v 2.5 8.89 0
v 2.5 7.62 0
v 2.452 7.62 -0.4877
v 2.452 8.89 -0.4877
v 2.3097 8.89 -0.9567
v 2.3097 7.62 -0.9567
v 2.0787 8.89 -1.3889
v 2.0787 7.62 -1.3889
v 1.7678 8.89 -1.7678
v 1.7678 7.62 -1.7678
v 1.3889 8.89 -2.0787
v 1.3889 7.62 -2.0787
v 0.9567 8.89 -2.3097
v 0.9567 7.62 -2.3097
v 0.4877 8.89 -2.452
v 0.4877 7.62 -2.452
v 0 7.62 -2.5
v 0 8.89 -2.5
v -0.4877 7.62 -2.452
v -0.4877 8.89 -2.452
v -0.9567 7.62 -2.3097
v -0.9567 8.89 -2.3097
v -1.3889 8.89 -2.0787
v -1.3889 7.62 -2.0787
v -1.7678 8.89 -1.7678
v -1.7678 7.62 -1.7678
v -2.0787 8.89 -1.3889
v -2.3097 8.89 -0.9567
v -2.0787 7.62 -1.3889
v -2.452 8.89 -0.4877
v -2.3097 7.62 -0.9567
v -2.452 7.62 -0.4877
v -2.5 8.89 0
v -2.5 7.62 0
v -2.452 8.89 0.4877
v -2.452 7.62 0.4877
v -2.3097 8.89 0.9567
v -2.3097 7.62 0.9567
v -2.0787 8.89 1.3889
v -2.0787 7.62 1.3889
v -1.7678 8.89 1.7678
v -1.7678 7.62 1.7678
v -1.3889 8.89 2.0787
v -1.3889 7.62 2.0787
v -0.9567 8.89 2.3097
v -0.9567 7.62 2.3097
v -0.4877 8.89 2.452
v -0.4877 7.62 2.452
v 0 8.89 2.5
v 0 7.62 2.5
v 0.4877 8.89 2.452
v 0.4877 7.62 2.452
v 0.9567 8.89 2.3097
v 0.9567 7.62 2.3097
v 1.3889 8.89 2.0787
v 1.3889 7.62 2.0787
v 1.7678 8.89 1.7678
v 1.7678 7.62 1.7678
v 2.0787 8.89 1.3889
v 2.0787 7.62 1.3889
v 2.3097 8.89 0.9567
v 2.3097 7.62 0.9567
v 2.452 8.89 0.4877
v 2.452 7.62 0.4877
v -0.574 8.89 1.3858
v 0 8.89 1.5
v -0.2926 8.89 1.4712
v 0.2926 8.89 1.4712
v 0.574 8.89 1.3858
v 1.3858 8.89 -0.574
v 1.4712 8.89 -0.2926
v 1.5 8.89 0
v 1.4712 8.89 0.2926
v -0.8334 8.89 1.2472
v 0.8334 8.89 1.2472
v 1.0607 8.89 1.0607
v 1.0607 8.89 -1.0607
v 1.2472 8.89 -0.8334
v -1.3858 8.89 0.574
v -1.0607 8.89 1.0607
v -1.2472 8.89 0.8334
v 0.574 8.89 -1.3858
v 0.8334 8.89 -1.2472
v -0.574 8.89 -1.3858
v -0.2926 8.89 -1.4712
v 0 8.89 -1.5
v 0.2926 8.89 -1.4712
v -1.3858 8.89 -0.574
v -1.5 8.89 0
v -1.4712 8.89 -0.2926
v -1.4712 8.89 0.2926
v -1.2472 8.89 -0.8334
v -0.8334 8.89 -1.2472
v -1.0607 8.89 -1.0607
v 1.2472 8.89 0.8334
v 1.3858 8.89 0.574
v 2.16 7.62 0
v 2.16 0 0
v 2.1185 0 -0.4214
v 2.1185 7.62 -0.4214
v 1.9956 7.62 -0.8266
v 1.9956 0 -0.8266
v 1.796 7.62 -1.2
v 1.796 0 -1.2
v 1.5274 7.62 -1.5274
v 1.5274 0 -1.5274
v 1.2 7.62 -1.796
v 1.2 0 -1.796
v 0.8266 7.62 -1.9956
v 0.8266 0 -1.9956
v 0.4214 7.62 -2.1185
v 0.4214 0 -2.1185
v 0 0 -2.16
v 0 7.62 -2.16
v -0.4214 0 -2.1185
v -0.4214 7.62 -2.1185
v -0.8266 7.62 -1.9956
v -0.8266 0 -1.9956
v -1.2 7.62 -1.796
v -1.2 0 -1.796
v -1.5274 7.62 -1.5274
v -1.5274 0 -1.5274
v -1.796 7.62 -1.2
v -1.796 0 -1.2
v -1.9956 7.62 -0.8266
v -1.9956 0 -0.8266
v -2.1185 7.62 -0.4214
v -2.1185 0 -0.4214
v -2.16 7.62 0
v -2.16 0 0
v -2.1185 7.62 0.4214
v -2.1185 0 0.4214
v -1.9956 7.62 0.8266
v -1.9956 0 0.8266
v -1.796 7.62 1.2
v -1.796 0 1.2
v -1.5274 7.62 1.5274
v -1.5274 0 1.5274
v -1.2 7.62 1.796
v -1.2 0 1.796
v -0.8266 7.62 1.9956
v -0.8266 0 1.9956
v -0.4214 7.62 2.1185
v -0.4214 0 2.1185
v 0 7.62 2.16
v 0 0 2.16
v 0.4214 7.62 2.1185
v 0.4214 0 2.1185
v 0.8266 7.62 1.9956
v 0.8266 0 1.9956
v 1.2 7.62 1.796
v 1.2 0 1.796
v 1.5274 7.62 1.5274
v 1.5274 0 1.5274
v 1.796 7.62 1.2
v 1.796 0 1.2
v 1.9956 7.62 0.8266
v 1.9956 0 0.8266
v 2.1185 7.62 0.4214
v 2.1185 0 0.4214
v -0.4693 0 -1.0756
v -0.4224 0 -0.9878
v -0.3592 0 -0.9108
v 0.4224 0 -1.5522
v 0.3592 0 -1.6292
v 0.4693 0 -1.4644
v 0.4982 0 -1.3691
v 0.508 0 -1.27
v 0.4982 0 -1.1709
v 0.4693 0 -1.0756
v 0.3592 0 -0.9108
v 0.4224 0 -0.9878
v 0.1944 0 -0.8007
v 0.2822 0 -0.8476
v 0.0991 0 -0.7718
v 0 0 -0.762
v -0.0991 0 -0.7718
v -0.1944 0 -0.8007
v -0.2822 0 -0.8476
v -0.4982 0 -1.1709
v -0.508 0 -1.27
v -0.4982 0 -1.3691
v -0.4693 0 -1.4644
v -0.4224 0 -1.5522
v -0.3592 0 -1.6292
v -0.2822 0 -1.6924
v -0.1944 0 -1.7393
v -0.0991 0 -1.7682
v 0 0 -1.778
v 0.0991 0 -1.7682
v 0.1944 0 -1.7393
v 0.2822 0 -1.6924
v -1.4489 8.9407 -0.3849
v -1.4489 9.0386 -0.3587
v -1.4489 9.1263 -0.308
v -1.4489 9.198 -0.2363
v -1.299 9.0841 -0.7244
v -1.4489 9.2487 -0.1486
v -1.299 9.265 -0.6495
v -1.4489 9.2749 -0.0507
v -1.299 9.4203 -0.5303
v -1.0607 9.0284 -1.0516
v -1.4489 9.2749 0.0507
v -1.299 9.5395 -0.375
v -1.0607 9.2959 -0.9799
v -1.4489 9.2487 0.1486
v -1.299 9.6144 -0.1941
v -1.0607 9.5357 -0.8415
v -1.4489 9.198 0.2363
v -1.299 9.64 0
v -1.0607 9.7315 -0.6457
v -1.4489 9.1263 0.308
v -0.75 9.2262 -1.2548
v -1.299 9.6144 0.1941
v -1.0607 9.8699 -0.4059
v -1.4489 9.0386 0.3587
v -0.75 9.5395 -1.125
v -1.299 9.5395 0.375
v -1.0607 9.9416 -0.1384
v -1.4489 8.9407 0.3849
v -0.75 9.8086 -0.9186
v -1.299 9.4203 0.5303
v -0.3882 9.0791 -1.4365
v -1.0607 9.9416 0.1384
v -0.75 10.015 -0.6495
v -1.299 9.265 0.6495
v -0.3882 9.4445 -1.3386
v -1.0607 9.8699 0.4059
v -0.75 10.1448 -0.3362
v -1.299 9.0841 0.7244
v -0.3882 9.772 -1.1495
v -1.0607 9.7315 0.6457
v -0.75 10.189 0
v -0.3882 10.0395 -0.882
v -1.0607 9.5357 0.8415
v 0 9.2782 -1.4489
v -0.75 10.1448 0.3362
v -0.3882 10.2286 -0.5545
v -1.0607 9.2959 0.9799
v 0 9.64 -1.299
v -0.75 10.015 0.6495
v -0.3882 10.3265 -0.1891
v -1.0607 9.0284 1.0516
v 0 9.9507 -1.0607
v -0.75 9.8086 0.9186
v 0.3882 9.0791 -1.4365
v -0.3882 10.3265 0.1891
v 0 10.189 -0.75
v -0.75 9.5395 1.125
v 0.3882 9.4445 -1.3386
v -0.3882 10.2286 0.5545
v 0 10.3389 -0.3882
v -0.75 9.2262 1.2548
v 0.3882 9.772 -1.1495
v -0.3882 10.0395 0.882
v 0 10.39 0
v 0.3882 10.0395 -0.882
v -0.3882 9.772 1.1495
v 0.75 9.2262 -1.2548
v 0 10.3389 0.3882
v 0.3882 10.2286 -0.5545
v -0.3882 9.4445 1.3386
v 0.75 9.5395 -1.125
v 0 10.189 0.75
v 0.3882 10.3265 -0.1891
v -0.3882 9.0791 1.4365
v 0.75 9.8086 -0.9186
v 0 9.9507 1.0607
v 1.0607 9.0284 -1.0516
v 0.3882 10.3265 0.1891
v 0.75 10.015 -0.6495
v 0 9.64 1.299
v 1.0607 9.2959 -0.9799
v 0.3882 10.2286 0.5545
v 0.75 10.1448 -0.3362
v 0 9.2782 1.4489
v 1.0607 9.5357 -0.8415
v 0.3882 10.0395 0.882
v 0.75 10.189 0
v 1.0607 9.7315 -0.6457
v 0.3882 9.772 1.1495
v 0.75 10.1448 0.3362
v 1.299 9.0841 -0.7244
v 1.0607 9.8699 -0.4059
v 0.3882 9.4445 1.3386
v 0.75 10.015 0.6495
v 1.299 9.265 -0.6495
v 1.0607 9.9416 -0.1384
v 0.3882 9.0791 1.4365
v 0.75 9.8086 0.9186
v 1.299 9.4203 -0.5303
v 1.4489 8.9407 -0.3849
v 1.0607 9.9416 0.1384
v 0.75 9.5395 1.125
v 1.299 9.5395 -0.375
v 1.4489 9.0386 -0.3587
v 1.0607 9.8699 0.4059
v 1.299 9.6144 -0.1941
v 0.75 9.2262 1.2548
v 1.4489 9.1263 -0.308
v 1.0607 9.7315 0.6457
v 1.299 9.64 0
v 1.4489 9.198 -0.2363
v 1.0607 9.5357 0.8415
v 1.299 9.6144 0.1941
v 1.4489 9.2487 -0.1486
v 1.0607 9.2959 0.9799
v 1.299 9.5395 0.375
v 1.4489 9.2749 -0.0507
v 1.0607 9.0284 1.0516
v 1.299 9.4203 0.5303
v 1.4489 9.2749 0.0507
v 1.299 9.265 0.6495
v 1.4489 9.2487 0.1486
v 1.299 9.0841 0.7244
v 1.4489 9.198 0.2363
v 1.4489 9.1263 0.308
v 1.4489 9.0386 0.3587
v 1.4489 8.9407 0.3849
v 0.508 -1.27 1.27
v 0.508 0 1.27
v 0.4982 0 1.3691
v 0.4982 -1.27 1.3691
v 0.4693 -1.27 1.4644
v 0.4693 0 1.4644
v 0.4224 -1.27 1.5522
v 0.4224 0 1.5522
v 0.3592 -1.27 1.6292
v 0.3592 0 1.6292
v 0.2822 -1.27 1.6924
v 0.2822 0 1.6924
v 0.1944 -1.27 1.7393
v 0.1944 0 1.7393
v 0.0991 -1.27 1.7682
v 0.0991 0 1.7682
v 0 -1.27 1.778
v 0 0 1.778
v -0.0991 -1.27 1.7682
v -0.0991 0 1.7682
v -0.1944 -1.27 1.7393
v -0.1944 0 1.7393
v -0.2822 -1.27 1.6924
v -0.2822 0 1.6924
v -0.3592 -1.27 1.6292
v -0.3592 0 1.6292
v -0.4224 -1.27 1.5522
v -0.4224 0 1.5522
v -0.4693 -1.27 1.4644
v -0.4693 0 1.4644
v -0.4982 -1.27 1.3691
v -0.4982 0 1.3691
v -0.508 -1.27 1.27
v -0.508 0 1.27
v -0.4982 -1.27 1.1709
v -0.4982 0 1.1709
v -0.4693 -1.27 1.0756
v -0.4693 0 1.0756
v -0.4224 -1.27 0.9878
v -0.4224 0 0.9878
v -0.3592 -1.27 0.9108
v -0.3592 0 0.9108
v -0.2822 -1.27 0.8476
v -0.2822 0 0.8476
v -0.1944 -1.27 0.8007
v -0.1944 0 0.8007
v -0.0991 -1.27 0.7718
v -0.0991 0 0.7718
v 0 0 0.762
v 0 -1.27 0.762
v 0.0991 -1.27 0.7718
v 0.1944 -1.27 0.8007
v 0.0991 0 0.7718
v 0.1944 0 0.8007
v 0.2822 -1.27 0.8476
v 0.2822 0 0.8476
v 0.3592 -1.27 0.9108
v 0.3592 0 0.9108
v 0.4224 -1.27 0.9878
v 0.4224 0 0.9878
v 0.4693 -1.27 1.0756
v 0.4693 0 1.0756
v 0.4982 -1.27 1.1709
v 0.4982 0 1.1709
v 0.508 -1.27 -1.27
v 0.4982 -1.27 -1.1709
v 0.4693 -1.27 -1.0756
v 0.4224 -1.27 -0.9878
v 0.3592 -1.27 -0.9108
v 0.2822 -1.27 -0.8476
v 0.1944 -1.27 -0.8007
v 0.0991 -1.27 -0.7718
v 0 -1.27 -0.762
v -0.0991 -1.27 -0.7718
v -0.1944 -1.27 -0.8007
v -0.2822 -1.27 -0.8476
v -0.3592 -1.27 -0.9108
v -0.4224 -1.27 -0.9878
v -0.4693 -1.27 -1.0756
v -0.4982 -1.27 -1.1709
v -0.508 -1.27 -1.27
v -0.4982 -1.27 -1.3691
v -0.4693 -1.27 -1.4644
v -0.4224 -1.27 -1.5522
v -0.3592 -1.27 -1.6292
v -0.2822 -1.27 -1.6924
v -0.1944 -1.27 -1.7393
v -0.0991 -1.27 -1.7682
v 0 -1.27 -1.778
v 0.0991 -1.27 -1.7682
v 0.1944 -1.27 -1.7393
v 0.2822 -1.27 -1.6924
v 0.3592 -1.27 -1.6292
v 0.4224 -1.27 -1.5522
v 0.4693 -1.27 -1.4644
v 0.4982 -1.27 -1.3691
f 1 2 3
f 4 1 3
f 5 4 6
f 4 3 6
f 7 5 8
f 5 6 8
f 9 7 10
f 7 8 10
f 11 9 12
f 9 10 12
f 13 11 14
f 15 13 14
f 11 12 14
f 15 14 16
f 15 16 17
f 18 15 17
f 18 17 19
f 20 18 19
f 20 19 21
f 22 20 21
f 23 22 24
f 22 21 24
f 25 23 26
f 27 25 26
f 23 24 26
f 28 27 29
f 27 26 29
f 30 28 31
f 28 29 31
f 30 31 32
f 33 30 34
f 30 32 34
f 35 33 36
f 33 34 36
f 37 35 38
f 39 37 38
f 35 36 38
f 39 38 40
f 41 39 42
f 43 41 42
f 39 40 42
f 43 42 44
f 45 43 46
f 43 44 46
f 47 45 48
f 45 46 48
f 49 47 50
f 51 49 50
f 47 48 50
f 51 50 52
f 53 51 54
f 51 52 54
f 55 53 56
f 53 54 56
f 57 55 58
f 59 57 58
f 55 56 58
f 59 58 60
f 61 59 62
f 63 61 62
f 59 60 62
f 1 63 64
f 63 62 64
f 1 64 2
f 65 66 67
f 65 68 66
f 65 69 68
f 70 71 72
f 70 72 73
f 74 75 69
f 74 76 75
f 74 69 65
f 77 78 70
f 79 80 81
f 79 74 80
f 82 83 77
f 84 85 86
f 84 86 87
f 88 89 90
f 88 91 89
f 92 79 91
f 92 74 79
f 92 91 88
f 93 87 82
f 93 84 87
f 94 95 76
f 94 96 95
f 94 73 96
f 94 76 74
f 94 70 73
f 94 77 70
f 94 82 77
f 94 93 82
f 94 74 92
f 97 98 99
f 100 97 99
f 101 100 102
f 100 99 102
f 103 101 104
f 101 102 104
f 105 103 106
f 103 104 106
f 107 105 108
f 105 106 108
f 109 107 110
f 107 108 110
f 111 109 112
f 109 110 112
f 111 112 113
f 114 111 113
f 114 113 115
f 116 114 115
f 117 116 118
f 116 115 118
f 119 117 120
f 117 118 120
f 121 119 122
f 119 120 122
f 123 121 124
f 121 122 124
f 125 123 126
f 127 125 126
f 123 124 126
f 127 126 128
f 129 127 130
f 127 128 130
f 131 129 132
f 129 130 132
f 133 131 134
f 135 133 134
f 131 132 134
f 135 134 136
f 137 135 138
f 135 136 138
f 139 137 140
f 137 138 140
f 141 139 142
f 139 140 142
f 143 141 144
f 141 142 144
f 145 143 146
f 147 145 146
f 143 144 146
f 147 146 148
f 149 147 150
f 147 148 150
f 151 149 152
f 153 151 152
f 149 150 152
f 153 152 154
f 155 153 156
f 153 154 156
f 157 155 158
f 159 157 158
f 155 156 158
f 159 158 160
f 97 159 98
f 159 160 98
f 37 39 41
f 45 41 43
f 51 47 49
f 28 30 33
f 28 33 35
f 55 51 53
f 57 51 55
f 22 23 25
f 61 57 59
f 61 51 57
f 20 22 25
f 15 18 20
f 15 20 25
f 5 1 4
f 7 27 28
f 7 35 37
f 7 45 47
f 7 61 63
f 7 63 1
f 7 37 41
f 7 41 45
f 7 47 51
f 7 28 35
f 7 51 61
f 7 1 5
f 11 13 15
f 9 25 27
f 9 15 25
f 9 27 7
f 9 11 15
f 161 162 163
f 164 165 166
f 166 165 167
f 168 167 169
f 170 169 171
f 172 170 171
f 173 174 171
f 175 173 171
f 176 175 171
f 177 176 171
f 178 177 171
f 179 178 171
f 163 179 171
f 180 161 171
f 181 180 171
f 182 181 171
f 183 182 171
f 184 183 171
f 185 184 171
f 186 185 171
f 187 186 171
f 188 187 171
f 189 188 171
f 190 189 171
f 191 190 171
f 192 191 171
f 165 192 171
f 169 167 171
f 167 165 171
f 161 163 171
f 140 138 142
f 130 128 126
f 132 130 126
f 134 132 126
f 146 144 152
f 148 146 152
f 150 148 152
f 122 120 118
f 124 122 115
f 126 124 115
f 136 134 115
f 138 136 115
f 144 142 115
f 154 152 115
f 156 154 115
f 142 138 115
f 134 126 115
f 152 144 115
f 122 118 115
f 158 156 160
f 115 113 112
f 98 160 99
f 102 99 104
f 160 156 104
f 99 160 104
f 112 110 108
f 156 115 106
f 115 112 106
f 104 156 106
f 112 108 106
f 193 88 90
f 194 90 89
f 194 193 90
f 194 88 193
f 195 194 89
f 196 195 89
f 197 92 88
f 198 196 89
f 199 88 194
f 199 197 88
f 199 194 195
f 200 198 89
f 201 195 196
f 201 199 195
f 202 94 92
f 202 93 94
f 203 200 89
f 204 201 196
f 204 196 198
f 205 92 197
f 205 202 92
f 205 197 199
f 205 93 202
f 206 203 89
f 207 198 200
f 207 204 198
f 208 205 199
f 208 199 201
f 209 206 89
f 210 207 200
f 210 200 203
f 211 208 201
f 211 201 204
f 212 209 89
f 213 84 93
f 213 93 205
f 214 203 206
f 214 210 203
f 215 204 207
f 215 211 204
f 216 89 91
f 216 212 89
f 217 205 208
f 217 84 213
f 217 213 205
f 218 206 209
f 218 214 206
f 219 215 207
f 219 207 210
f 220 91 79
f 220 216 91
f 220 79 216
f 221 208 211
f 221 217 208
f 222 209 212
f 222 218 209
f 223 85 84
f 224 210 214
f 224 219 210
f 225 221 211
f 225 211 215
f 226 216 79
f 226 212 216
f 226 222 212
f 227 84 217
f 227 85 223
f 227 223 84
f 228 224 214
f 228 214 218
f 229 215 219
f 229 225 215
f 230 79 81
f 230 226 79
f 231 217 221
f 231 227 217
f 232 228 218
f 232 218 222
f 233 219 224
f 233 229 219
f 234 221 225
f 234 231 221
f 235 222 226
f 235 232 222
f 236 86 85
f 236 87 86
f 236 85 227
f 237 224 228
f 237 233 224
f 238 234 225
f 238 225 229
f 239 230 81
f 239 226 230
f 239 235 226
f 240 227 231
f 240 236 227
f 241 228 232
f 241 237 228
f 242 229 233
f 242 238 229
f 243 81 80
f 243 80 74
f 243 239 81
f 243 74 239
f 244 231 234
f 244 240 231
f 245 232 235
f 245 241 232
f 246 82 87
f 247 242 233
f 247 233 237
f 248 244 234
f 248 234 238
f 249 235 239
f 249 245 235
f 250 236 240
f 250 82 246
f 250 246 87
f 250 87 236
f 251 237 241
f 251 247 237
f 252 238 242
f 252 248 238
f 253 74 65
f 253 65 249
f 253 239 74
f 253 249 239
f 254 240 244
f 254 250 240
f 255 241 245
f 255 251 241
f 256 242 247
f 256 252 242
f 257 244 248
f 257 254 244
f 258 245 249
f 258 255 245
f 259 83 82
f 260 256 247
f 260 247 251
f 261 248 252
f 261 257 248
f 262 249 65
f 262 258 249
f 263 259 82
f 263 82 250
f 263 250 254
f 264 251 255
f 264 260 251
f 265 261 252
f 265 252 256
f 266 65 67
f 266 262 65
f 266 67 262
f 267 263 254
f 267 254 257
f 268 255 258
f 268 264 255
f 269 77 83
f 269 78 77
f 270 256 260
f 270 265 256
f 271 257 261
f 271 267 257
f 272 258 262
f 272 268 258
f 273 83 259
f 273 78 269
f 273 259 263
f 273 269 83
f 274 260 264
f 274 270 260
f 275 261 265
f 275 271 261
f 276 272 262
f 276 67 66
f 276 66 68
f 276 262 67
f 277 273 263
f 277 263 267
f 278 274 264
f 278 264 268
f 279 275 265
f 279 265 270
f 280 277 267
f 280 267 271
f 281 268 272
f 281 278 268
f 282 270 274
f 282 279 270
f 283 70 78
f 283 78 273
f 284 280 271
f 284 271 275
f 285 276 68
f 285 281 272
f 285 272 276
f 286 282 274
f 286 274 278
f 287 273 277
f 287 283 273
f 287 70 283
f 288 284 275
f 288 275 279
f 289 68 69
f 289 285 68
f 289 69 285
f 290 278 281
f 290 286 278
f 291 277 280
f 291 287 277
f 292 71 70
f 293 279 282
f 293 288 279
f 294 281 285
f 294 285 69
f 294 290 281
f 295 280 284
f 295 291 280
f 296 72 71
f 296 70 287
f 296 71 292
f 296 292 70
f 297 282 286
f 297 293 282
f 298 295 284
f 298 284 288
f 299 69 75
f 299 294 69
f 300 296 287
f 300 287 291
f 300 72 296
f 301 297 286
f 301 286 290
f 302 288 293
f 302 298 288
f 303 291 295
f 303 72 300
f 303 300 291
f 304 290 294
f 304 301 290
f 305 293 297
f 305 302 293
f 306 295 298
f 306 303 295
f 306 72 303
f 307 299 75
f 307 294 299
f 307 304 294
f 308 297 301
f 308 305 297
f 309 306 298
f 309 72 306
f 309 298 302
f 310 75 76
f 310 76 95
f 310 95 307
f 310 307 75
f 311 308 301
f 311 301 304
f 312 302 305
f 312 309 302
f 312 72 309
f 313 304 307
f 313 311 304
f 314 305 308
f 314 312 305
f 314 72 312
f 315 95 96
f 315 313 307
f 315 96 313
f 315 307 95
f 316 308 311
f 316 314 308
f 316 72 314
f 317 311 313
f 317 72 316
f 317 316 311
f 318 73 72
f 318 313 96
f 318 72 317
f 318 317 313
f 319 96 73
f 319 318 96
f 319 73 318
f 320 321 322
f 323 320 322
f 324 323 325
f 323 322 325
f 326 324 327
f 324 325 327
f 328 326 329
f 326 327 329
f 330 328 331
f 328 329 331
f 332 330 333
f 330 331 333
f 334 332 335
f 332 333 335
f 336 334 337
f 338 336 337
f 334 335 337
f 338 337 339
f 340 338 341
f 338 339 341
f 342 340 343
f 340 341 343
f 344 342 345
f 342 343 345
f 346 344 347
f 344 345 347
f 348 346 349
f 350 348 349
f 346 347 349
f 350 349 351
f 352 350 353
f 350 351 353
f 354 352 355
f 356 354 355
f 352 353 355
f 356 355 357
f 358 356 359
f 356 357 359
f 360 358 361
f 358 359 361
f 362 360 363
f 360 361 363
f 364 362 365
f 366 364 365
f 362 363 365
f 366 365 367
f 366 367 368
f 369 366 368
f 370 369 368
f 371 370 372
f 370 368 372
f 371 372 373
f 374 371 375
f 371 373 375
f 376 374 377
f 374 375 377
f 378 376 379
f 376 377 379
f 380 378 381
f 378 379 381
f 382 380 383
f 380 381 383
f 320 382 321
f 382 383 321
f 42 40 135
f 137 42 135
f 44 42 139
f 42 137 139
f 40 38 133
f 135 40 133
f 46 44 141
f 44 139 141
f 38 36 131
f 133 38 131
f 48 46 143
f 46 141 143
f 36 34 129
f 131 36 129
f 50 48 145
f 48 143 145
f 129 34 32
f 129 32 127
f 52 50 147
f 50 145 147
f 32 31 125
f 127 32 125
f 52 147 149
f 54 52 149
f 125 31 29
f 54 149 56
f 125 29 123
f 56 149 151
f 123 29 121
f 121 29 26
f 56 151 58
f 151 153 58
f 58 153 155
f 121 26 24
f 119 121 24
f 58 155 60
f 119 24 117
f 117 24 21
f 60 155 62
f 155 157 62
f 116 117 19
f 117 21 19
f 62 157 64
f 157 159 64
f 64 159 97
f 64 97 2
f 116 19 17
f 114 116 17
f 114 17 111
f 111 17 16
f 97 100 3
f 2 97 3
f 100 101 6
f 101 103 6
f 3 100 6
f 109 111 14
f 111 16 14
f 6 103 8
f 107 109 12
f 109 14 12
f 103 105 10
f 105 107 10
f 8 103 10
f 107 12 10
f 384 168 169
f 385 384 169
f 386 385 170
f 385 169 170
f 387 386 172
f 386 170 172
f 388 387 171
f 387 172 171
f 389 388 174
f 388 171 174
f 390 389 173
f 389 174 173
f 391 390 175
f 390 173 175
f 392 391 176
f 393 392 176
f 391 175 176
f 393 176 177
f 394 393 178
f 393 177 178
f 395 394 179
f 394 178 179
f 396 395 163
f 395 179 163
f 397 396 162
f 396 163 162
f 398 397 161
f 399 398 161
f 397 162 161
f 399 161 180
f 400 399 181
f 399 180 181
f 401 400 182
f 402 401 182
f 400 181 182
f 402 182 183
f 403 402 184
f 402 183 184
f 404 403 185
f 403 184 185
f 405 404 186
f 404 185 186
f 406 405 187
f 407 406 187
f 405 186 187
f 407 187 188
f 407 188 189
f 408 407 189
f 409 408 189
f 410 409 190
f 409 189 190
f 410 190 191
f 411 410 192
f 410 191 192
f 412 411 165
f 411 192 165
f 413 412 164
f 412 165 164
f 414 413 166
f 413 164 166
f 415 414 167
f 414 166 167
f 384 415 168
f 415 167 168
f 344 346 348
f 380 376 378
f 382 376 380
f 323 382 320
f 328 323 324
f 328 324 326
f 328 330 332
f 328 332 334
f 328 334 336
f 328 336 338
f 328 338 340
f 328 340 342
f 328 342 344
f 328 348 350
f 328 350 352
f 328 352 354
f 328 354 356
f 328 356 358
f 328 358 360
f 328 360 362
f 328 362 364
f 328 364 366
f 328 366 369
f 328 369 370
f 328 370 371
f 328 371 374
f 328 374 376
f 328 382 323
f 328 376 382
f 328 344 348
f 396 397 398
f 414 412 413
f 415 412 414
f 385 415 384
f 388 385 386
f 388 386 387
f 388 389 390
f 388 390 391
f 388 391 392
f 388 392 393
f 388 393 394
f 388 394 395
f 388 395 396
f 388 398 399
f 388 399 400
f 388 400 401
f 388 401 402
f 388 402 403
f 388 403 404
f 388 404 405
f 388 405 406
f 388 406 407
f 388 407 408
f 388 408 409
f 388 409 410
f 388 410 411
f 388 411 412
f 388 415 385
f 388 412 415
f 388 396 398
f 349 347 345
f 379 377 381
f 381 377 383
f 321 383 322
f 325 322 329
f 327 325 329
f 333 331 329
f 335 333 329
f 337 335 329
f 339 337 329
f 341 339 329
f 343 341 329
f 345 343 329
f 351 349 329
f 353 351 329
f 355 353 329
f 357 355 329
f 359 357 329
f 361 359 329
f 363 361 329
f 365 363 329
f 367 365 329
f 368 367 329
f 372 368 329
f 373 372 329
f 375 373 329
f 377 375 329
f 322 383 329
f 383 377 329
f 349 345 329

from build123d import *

# Parameters (mm, degrees)
SKETCH1_R             = 2.16
BOSS_EXTRUDE1_DEPTH   = 7.62
SKETCH2_R             = 2.5
BOSS_EXTRUDE2_DEPTH   = 1.27
REVOLVE1_ANGLE        = 180
SKETCH4_R             = 0.508
BOSS_EXTRUDE3_DEPTH   = 1.27
BOSS_EXTRUDE3_2_DEPTH = 1.27


with BuildPart() as part:
    # Sketch1 → Boss-Extrude1 (new body)
    with BuildSketch(Plane(origin=(0, 0, 0), x_dir=(1, 0, 0), z_dir=(0, 1, 0))):
        Circle(SKETCH1_R)
    extrude(amount=BOSS_EXTRUDE1_DEPTH)

    # Sketch2 → Boss-Extrude2 (add)
    with BuildSketch(Plane(origin=(0, 7.62, 0), x_dir=(1, 0, 0), z_dir=(0, 1, 0))):
        Circle(SKETCH2_R)
    extrude(amount=BOSS_EXTRUDE2_DEPTH)


with BuildPart() as body_2:
    # Sketch3 → Revolve1 (revolve)
    with BuildSketch(Plane(origin=(0, 8.89, 0), x_dir=(1, 0, 0), z_dir=(0, 1, 0))):
        with BuildLine():
            Line((1.5, 0), (-1.5, 0))
            ThreePointArc((-1.5, 0), (0, 1.5), (1.5, 0))
        make_face()
    revolve(axis=Axis((1.5, 8.89, 0), (1, 0, 0)), revolution_arc=REVOLVE1_ANGLE)


with BuildPart() as body_3:
    # Sketch4 → Boss-Extrude3 (new body)
    with BuildSketch(Plane.XZ):
        with Locations((0, 1.27)):
            Circle(SKETCH4_R)
    extrude(amount=BOSS_EXTRUDE3_DEPTH)


with BuildPart() as body_4:
    # Sketch4 → Boss-Extrude3 2 (new body)
    with BuildSketch(Plane.XZ):
        with Locations((0, -1.27)):
            Circle(SKETCH4_R)
    extrude(amount=BOSS_EXTRUDE3_2_DEPTH)


solid = Compound([part.part, body_2.part, body_3.part, body_4.part])
